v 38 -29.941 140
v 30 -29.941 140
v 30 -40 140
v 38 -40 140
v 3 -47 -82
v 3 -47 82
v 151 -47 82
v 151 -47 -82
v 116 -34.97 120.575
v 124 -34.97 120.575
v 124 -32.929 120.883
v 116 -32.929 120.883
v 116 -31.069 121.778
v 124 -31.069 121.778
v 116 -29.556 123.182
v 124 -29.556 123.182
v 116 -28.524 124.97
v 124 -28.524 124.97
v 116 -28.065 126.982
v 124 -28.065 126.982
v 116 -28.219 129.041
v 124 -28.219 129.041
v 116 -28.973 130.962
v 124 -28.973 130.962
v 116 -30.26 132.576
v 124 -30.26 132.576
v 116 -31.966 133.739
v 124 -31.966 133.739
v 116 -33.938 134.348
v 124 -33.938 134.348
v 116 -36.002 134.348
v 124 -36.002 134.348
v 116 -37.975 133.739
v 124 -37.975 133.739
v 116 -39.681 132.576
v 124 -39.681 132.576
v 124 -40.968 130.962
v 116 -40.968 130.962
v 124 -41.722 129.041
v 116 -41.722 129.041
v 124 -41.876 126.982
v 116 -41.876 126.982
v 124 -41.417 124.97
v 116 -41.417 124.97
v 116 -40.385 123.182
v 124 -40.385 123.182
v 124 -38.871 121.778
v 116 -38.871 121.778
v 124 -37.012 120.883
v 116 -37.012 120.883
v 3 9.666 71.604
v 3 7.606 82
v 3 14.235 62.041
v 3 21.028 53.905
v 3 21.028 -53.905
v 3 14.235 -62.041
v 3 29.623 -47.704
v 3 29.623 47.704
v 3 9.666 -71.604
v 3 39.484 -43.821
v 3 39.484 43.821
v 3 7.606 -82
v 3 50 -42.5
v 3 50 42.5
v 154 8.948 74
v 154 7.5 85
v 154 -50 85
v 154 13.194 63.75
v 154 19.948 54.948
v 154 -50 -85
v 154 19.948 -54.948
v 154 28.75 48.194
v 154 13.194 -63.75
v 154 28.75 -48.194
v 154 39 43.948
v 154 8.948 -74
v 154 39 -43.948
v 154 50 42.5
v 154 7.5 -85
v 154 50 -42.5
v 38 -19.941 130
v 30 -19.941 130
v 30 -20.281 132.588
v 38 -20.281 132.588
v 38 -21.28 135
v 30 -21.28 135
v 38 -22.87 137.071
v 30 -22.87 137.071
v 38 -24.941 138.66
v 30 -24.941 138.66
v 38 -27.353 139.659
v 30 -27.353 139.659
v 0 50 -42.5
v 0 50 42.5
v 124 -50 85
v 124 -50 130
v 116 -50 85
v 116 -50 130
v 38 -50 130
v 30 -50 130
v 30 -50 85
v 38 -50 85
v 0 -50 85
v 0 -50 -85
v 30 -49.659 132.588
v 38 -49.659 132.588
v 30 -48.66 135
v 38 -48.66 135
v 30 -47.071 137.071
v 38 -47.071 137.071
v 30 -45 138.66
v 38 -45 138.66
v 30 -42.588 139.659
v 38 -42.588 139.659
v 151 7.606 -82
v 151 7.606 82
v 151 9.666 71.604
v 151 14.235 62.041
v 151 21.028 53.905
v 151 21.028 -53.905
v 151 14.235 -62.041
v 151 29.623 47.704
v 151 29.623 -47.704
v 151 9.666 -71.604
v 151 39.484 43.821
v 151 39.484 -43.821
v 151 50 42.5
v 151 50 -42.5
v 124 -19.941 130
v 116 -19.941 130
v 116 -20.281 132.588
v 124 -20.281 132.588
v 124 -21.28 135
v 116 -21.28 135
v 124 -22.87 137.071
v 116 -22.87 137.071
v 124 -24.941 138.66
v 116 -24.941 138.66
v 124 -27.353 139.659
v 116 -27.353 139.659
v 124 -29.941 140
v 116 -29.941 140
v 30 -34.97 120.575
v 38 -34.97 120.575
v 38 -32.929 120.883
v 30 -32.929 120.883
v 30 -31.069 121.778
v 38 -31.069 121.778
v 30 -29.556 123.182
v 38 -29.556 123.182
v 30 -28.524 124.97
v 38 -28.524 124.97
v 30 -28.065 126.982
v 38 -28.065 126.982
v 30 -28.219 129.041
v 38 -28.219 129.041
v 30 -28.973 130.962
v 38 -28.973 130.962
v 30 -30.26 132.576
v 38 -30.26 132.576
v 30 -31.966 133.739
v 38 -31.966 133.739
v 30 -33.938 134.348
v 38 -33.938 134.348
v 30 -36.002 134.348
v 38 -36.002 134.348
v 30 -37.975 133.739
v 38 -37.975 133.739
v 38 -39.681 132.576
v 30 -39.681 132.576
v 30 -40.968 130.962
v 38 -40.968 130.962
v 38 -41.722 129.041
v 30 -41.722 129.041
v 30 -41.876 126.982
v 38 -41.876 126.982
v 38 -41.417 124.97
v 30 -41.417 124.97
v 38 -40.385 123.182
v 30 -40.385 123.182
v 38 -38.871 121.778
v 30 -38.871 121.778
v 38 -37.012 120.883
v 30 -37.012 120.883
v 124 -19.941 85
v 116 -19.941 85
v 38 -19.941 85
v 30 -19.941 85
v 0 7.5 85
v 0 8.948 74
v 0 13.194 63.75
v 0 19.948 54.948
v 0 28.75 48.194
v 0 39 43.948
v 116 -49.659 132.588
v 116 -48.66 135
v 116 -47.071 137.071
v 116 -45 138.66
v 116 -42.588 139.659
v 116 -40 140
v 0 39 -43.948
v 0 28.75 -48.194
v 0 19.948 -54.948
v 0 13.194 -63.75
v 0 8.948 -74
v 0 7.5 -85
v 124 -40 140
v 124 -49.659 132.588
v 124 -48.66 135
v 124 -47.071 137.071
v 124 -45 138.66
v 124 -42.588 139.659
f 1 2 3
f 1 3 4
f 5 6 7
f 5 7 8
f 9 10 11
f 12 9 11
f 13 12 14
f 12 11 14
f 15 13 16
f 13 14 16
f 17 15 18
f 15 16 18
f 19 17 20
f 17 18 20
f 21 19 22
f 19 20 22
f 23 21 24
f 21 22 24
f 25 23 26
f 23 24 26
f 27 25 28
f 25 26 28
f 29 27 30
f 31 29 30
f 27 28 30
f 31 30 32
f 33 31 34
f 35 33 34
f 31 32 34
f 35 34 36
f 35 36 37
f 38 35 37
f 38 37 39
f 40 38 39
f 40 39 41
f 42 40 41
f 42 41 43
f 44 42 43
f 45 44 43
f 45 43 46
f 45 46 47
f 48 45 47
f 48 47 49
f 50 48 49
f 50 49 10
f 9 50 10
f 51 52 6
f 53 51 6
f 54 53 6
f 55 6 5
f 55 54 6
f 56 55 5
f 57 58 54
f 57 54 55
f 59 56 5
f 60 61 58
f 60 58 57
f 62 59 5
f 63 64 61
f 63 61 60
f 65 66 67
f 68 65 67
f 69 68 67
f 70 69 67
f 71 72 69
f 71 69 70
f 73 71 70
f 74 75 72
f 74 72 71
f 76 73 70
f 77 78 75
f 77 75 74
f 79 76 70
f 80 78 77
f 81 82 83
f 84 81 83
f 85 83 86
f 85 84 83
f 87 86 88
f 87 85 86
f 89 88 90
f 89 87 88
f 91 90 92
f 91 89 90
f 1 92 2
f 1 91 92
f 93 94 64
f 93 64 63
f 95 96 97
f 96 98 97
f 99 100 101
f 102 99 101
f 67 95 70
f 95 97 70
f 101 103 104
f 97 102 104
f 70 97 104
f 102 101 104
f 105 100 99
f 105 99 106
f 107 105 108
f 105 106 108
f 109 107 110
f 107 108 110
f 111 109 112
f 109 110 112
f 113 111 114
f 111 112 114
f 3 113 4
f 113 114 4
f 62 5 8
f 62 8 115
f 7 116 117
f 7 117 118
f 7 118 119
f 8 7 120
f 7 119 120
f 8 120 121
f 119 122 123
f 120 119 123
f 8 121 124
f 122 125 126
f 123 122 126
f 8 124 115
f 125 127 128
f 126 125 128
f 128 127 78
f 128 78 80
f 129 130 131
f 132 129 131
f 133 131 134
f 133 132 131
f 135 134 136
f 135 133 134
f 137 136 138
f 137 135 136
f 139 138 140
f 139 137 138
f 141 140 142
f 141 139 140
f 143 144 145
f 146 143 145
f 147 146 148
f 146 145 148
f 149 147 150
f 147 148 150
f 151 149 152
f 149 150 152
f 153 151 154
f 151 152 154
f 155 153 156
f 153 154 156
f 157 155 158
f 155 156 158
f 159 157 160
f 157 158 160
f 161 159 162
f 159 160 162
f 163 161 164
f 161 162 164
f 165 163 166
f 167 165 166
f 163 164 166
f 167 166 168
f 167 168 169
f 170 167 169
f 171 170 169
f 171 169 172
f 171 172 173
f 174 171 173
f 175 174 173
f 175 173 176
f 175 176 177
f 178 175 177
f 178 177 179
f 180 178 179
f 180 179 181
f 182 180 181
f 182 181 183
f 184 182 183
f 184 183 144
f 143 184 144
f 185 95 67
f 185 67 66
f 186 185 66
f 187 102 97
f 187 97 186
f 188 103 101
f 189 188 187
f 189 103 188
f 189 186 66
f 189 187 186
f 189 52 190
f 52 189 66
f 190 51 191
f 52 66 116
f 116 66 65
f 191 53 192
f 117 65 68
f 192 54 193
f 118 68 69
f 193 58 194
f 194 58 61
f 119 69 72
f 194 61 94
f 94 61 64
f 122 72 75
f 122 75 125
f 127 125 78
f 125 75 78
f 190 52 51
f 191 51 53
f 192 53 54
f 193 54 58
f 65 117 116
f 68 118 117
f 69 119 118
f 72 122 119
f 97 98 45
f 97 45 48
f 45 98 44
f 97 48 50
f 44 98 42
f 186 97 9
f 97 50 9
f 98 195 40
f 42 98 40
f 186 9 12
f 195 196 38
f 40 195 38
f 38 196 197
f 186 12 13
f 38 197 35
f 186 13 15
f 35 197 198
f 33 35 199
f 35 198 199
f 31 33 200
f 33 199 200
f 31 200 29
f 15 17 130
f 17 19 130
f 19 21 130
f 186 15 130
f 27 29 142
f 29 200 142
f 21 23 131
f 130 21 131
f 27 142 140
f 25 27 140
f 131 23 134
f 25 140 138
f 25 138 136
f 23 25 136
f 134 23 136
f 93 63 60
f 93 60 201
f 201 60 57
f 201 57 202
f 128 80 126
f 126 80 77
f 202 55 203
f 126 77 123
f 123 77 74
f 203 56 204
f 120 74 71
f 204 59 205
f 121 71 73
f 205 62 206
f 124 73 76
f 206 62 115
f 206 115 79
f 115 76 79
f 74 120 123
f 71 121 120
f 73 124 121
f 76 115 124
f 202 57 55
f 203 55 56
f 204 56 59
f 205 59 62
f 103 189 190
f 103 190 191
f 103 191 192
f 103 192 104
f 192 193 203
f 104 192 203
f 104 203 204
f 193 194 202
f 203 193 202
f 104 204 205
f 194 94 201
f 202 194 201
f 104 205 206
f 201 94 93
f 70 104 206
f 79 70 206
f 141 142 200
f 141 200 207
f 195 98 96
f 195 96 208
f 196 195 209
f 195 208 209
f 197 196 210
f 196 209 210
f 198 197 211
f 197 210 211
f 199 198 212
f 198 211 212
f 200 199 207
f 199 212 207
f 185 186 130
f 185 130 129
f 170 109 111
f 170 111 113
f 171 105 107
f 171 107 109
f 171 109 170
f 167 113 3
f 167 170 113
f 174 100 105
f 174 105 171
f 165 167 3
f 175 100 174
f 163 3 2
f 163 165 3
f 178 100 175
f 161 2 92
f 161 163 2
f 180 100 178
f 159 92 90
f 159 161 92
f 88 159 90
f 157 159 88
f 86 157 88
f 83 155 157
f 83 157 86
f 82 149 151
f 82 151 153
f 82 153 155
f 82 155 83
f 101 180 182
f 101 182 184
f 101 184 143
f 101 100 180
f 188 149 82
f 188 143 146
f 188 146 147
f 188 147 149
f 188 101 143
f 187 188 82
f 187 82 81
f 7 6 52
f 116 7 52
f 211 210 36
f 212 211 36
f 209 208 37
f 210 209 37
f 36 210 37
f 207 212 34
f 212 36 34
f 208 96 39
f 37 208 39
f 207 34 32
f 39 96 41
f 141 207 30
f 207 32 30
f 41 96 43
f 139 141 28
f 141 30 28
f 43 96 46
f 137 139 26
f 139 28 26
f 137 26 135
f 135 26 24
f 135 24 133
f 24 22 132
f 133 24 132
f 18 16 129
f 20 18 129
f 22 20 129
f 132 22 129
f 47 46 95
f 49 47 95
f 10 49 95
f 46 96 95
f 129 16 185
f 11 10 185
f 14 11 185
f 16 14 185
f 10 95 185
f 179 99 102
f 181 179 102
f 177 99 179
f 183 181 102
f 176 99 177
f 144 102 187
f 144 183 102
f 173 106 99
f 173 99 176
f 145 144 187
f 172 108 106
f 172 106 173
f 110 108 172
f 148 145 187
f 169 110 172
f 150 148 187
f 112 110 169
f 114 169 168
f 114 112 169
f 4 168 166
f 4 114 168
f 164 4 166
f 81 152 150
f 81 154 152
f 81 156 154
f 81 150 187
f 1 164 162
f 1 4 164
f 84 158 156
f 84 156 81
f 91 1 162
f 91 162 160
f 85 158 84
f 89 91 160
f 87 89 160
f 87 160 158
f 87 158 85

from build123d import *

# Parameters (mm, degrees)
SKETCH2_W           = 170
SKETCH2_H           = 100
BOSS_EXTRUDE5_DEPTH = 154
SHELL1_T            = -3
SKETCH6_W           = 94
SKETCH6_H           = 30.059246991
BOSS_EXTRUDE6_DEPTH = 55
SKETCH7_W           = 78
SKETCH7_H           = 30.059246991
CUT_EXTRUDE3_DEPTH  = 55
SKETCH8_R           = 6.925
CUT_EXTRUDE5_DEPTH  = 94
FILLET1_R           = 10
CUT_EXTRUDE6_REACH  = 216.047
SKETCH9_R           = 42.5


with BuildPart() as part:
    # Sketch2 → Boss-Extrude5 (new body)
    with BuildSketch(Plane(origin=(0, 0, 0), x_dir=(0, 0, -1), z_dir=(1, 0, 0))):
        Rectangle(SKETCH2_W, SKETCH2_H)
    extrude(amount=BOSS_EXTRUDE5_DEPTH)

    # Shell1
    shell1_openings = [part.faces().sort_by_distance(p)[0] for p in [
        (77, 50, 0),
    ]]
    offset(amount=SHELL1_T, openings=shell1_openings, kind=Kind.INTERSECTION)

    # Sketch6 → Boss-Extrude6 (add)
    with BuildSketch(Plane.XY.offset(85)):
        with Locations((77, -34.970376505)):
            Rectangle(SKETCH6_W, SKETCH6_H)
    extrude(amount=BOSS_EXTRUDE6_DEPTH)

    # Sketch7 → Cut-Extrude3 (cut)
    with BuildSketch(Plane.XY.offset(140)):
        with Locations((77, -34.970376505)):
            Rectangle(SKETCH7_W, SKETCH7_H)
    extrude(amount=-CUT_EXTRUDE3_DEPTH, mode=Mode.SUBTRACT)

    # Sketch8 → Cut-Extrude5 (cut)
    with BuildSketch(Plane(origin=(124, 0, 0), x_dir=(0, 0, -1), z_dir=(1, 0, 0))):
        with Locations((-127.5, -34.970376505)):
            Circle(SKETCH8_R)
    extrude(amount=-CUT_EXTRUDE5_DEPTH, mode=Mode.SUBTRACT)

    # Fillet1
    fillet1_edges = [part.edges().sort_by_distance(p)[0] for p in [
        (34, -19.940753009, 140),
        (34, -50, 140),
        (120, -50, 140),
        (120, -19.940753009, 140),
    ]]
    fillet(fillet1_edges, radius=FILLET1_R)

    # Cut-Extrude6: up to this face of the body (flat: up to its plane)
    cut_extrude6_end = Plane(part.part.faces().sort_by_distance((0, 0, 0))[0])
    # Sketch9 → Cut-Extrude6 (cut, up to the picked face)
    with BuildSketch(Plane(origin=(154, 0, 0), x_dir=(0, 0, -1), z_dir=(1, 0, 0)), mode=Mode.PRIVATE) as cut_extrude6_sk1:
        with Locations((85, 50)):
            Circle(SKETCH9_R)
    cut_extrude6_tool1 = split(extrude(cut_extrude6_sk1.sketch, amount=-CUT_EXTRUDE6_REACH, mode=Mode.PRIVATE), bisect_by=cut_extrude6_end, keep=Keep.BOTH, mode=Mode.PRIVATE)
    # Sketch9 → Cut-Extrude6 (cut, up to the picked face)
    with BuildSketch(Plane(origin=(154, 0, 0), x_dir=(0, 0, -1), z_dir=(1, 0, 0)), mode=Mode.PRIVATE) as cut_extrude6_sk2:
        with Locations((-85, 50)):
            Circle(SKETCH9_R)
    cut_extrude6_tool2 = split(extrude(cut_extrude6_sk2.sketch, amount=-CUT_EXTRUDE6_REACH, mode=Mode.PRIVATE), bisect_by=cut_extrude6_end, keep=Keep.BOTH, mode=Mode.PRIVATE)
    add(cut_extrude6_tool1.solids().sort_by(Axis((154, 50, -85), (-1, 0, 0)))[0], mode=Mode.SUBTRACT)
    add(cut_extrude6_tool2.solids().sort_by(Axis((154, 50, 85), (-1, 0, 0)))[0], mode=Mode.SUBTRACT)


solid = part.part
